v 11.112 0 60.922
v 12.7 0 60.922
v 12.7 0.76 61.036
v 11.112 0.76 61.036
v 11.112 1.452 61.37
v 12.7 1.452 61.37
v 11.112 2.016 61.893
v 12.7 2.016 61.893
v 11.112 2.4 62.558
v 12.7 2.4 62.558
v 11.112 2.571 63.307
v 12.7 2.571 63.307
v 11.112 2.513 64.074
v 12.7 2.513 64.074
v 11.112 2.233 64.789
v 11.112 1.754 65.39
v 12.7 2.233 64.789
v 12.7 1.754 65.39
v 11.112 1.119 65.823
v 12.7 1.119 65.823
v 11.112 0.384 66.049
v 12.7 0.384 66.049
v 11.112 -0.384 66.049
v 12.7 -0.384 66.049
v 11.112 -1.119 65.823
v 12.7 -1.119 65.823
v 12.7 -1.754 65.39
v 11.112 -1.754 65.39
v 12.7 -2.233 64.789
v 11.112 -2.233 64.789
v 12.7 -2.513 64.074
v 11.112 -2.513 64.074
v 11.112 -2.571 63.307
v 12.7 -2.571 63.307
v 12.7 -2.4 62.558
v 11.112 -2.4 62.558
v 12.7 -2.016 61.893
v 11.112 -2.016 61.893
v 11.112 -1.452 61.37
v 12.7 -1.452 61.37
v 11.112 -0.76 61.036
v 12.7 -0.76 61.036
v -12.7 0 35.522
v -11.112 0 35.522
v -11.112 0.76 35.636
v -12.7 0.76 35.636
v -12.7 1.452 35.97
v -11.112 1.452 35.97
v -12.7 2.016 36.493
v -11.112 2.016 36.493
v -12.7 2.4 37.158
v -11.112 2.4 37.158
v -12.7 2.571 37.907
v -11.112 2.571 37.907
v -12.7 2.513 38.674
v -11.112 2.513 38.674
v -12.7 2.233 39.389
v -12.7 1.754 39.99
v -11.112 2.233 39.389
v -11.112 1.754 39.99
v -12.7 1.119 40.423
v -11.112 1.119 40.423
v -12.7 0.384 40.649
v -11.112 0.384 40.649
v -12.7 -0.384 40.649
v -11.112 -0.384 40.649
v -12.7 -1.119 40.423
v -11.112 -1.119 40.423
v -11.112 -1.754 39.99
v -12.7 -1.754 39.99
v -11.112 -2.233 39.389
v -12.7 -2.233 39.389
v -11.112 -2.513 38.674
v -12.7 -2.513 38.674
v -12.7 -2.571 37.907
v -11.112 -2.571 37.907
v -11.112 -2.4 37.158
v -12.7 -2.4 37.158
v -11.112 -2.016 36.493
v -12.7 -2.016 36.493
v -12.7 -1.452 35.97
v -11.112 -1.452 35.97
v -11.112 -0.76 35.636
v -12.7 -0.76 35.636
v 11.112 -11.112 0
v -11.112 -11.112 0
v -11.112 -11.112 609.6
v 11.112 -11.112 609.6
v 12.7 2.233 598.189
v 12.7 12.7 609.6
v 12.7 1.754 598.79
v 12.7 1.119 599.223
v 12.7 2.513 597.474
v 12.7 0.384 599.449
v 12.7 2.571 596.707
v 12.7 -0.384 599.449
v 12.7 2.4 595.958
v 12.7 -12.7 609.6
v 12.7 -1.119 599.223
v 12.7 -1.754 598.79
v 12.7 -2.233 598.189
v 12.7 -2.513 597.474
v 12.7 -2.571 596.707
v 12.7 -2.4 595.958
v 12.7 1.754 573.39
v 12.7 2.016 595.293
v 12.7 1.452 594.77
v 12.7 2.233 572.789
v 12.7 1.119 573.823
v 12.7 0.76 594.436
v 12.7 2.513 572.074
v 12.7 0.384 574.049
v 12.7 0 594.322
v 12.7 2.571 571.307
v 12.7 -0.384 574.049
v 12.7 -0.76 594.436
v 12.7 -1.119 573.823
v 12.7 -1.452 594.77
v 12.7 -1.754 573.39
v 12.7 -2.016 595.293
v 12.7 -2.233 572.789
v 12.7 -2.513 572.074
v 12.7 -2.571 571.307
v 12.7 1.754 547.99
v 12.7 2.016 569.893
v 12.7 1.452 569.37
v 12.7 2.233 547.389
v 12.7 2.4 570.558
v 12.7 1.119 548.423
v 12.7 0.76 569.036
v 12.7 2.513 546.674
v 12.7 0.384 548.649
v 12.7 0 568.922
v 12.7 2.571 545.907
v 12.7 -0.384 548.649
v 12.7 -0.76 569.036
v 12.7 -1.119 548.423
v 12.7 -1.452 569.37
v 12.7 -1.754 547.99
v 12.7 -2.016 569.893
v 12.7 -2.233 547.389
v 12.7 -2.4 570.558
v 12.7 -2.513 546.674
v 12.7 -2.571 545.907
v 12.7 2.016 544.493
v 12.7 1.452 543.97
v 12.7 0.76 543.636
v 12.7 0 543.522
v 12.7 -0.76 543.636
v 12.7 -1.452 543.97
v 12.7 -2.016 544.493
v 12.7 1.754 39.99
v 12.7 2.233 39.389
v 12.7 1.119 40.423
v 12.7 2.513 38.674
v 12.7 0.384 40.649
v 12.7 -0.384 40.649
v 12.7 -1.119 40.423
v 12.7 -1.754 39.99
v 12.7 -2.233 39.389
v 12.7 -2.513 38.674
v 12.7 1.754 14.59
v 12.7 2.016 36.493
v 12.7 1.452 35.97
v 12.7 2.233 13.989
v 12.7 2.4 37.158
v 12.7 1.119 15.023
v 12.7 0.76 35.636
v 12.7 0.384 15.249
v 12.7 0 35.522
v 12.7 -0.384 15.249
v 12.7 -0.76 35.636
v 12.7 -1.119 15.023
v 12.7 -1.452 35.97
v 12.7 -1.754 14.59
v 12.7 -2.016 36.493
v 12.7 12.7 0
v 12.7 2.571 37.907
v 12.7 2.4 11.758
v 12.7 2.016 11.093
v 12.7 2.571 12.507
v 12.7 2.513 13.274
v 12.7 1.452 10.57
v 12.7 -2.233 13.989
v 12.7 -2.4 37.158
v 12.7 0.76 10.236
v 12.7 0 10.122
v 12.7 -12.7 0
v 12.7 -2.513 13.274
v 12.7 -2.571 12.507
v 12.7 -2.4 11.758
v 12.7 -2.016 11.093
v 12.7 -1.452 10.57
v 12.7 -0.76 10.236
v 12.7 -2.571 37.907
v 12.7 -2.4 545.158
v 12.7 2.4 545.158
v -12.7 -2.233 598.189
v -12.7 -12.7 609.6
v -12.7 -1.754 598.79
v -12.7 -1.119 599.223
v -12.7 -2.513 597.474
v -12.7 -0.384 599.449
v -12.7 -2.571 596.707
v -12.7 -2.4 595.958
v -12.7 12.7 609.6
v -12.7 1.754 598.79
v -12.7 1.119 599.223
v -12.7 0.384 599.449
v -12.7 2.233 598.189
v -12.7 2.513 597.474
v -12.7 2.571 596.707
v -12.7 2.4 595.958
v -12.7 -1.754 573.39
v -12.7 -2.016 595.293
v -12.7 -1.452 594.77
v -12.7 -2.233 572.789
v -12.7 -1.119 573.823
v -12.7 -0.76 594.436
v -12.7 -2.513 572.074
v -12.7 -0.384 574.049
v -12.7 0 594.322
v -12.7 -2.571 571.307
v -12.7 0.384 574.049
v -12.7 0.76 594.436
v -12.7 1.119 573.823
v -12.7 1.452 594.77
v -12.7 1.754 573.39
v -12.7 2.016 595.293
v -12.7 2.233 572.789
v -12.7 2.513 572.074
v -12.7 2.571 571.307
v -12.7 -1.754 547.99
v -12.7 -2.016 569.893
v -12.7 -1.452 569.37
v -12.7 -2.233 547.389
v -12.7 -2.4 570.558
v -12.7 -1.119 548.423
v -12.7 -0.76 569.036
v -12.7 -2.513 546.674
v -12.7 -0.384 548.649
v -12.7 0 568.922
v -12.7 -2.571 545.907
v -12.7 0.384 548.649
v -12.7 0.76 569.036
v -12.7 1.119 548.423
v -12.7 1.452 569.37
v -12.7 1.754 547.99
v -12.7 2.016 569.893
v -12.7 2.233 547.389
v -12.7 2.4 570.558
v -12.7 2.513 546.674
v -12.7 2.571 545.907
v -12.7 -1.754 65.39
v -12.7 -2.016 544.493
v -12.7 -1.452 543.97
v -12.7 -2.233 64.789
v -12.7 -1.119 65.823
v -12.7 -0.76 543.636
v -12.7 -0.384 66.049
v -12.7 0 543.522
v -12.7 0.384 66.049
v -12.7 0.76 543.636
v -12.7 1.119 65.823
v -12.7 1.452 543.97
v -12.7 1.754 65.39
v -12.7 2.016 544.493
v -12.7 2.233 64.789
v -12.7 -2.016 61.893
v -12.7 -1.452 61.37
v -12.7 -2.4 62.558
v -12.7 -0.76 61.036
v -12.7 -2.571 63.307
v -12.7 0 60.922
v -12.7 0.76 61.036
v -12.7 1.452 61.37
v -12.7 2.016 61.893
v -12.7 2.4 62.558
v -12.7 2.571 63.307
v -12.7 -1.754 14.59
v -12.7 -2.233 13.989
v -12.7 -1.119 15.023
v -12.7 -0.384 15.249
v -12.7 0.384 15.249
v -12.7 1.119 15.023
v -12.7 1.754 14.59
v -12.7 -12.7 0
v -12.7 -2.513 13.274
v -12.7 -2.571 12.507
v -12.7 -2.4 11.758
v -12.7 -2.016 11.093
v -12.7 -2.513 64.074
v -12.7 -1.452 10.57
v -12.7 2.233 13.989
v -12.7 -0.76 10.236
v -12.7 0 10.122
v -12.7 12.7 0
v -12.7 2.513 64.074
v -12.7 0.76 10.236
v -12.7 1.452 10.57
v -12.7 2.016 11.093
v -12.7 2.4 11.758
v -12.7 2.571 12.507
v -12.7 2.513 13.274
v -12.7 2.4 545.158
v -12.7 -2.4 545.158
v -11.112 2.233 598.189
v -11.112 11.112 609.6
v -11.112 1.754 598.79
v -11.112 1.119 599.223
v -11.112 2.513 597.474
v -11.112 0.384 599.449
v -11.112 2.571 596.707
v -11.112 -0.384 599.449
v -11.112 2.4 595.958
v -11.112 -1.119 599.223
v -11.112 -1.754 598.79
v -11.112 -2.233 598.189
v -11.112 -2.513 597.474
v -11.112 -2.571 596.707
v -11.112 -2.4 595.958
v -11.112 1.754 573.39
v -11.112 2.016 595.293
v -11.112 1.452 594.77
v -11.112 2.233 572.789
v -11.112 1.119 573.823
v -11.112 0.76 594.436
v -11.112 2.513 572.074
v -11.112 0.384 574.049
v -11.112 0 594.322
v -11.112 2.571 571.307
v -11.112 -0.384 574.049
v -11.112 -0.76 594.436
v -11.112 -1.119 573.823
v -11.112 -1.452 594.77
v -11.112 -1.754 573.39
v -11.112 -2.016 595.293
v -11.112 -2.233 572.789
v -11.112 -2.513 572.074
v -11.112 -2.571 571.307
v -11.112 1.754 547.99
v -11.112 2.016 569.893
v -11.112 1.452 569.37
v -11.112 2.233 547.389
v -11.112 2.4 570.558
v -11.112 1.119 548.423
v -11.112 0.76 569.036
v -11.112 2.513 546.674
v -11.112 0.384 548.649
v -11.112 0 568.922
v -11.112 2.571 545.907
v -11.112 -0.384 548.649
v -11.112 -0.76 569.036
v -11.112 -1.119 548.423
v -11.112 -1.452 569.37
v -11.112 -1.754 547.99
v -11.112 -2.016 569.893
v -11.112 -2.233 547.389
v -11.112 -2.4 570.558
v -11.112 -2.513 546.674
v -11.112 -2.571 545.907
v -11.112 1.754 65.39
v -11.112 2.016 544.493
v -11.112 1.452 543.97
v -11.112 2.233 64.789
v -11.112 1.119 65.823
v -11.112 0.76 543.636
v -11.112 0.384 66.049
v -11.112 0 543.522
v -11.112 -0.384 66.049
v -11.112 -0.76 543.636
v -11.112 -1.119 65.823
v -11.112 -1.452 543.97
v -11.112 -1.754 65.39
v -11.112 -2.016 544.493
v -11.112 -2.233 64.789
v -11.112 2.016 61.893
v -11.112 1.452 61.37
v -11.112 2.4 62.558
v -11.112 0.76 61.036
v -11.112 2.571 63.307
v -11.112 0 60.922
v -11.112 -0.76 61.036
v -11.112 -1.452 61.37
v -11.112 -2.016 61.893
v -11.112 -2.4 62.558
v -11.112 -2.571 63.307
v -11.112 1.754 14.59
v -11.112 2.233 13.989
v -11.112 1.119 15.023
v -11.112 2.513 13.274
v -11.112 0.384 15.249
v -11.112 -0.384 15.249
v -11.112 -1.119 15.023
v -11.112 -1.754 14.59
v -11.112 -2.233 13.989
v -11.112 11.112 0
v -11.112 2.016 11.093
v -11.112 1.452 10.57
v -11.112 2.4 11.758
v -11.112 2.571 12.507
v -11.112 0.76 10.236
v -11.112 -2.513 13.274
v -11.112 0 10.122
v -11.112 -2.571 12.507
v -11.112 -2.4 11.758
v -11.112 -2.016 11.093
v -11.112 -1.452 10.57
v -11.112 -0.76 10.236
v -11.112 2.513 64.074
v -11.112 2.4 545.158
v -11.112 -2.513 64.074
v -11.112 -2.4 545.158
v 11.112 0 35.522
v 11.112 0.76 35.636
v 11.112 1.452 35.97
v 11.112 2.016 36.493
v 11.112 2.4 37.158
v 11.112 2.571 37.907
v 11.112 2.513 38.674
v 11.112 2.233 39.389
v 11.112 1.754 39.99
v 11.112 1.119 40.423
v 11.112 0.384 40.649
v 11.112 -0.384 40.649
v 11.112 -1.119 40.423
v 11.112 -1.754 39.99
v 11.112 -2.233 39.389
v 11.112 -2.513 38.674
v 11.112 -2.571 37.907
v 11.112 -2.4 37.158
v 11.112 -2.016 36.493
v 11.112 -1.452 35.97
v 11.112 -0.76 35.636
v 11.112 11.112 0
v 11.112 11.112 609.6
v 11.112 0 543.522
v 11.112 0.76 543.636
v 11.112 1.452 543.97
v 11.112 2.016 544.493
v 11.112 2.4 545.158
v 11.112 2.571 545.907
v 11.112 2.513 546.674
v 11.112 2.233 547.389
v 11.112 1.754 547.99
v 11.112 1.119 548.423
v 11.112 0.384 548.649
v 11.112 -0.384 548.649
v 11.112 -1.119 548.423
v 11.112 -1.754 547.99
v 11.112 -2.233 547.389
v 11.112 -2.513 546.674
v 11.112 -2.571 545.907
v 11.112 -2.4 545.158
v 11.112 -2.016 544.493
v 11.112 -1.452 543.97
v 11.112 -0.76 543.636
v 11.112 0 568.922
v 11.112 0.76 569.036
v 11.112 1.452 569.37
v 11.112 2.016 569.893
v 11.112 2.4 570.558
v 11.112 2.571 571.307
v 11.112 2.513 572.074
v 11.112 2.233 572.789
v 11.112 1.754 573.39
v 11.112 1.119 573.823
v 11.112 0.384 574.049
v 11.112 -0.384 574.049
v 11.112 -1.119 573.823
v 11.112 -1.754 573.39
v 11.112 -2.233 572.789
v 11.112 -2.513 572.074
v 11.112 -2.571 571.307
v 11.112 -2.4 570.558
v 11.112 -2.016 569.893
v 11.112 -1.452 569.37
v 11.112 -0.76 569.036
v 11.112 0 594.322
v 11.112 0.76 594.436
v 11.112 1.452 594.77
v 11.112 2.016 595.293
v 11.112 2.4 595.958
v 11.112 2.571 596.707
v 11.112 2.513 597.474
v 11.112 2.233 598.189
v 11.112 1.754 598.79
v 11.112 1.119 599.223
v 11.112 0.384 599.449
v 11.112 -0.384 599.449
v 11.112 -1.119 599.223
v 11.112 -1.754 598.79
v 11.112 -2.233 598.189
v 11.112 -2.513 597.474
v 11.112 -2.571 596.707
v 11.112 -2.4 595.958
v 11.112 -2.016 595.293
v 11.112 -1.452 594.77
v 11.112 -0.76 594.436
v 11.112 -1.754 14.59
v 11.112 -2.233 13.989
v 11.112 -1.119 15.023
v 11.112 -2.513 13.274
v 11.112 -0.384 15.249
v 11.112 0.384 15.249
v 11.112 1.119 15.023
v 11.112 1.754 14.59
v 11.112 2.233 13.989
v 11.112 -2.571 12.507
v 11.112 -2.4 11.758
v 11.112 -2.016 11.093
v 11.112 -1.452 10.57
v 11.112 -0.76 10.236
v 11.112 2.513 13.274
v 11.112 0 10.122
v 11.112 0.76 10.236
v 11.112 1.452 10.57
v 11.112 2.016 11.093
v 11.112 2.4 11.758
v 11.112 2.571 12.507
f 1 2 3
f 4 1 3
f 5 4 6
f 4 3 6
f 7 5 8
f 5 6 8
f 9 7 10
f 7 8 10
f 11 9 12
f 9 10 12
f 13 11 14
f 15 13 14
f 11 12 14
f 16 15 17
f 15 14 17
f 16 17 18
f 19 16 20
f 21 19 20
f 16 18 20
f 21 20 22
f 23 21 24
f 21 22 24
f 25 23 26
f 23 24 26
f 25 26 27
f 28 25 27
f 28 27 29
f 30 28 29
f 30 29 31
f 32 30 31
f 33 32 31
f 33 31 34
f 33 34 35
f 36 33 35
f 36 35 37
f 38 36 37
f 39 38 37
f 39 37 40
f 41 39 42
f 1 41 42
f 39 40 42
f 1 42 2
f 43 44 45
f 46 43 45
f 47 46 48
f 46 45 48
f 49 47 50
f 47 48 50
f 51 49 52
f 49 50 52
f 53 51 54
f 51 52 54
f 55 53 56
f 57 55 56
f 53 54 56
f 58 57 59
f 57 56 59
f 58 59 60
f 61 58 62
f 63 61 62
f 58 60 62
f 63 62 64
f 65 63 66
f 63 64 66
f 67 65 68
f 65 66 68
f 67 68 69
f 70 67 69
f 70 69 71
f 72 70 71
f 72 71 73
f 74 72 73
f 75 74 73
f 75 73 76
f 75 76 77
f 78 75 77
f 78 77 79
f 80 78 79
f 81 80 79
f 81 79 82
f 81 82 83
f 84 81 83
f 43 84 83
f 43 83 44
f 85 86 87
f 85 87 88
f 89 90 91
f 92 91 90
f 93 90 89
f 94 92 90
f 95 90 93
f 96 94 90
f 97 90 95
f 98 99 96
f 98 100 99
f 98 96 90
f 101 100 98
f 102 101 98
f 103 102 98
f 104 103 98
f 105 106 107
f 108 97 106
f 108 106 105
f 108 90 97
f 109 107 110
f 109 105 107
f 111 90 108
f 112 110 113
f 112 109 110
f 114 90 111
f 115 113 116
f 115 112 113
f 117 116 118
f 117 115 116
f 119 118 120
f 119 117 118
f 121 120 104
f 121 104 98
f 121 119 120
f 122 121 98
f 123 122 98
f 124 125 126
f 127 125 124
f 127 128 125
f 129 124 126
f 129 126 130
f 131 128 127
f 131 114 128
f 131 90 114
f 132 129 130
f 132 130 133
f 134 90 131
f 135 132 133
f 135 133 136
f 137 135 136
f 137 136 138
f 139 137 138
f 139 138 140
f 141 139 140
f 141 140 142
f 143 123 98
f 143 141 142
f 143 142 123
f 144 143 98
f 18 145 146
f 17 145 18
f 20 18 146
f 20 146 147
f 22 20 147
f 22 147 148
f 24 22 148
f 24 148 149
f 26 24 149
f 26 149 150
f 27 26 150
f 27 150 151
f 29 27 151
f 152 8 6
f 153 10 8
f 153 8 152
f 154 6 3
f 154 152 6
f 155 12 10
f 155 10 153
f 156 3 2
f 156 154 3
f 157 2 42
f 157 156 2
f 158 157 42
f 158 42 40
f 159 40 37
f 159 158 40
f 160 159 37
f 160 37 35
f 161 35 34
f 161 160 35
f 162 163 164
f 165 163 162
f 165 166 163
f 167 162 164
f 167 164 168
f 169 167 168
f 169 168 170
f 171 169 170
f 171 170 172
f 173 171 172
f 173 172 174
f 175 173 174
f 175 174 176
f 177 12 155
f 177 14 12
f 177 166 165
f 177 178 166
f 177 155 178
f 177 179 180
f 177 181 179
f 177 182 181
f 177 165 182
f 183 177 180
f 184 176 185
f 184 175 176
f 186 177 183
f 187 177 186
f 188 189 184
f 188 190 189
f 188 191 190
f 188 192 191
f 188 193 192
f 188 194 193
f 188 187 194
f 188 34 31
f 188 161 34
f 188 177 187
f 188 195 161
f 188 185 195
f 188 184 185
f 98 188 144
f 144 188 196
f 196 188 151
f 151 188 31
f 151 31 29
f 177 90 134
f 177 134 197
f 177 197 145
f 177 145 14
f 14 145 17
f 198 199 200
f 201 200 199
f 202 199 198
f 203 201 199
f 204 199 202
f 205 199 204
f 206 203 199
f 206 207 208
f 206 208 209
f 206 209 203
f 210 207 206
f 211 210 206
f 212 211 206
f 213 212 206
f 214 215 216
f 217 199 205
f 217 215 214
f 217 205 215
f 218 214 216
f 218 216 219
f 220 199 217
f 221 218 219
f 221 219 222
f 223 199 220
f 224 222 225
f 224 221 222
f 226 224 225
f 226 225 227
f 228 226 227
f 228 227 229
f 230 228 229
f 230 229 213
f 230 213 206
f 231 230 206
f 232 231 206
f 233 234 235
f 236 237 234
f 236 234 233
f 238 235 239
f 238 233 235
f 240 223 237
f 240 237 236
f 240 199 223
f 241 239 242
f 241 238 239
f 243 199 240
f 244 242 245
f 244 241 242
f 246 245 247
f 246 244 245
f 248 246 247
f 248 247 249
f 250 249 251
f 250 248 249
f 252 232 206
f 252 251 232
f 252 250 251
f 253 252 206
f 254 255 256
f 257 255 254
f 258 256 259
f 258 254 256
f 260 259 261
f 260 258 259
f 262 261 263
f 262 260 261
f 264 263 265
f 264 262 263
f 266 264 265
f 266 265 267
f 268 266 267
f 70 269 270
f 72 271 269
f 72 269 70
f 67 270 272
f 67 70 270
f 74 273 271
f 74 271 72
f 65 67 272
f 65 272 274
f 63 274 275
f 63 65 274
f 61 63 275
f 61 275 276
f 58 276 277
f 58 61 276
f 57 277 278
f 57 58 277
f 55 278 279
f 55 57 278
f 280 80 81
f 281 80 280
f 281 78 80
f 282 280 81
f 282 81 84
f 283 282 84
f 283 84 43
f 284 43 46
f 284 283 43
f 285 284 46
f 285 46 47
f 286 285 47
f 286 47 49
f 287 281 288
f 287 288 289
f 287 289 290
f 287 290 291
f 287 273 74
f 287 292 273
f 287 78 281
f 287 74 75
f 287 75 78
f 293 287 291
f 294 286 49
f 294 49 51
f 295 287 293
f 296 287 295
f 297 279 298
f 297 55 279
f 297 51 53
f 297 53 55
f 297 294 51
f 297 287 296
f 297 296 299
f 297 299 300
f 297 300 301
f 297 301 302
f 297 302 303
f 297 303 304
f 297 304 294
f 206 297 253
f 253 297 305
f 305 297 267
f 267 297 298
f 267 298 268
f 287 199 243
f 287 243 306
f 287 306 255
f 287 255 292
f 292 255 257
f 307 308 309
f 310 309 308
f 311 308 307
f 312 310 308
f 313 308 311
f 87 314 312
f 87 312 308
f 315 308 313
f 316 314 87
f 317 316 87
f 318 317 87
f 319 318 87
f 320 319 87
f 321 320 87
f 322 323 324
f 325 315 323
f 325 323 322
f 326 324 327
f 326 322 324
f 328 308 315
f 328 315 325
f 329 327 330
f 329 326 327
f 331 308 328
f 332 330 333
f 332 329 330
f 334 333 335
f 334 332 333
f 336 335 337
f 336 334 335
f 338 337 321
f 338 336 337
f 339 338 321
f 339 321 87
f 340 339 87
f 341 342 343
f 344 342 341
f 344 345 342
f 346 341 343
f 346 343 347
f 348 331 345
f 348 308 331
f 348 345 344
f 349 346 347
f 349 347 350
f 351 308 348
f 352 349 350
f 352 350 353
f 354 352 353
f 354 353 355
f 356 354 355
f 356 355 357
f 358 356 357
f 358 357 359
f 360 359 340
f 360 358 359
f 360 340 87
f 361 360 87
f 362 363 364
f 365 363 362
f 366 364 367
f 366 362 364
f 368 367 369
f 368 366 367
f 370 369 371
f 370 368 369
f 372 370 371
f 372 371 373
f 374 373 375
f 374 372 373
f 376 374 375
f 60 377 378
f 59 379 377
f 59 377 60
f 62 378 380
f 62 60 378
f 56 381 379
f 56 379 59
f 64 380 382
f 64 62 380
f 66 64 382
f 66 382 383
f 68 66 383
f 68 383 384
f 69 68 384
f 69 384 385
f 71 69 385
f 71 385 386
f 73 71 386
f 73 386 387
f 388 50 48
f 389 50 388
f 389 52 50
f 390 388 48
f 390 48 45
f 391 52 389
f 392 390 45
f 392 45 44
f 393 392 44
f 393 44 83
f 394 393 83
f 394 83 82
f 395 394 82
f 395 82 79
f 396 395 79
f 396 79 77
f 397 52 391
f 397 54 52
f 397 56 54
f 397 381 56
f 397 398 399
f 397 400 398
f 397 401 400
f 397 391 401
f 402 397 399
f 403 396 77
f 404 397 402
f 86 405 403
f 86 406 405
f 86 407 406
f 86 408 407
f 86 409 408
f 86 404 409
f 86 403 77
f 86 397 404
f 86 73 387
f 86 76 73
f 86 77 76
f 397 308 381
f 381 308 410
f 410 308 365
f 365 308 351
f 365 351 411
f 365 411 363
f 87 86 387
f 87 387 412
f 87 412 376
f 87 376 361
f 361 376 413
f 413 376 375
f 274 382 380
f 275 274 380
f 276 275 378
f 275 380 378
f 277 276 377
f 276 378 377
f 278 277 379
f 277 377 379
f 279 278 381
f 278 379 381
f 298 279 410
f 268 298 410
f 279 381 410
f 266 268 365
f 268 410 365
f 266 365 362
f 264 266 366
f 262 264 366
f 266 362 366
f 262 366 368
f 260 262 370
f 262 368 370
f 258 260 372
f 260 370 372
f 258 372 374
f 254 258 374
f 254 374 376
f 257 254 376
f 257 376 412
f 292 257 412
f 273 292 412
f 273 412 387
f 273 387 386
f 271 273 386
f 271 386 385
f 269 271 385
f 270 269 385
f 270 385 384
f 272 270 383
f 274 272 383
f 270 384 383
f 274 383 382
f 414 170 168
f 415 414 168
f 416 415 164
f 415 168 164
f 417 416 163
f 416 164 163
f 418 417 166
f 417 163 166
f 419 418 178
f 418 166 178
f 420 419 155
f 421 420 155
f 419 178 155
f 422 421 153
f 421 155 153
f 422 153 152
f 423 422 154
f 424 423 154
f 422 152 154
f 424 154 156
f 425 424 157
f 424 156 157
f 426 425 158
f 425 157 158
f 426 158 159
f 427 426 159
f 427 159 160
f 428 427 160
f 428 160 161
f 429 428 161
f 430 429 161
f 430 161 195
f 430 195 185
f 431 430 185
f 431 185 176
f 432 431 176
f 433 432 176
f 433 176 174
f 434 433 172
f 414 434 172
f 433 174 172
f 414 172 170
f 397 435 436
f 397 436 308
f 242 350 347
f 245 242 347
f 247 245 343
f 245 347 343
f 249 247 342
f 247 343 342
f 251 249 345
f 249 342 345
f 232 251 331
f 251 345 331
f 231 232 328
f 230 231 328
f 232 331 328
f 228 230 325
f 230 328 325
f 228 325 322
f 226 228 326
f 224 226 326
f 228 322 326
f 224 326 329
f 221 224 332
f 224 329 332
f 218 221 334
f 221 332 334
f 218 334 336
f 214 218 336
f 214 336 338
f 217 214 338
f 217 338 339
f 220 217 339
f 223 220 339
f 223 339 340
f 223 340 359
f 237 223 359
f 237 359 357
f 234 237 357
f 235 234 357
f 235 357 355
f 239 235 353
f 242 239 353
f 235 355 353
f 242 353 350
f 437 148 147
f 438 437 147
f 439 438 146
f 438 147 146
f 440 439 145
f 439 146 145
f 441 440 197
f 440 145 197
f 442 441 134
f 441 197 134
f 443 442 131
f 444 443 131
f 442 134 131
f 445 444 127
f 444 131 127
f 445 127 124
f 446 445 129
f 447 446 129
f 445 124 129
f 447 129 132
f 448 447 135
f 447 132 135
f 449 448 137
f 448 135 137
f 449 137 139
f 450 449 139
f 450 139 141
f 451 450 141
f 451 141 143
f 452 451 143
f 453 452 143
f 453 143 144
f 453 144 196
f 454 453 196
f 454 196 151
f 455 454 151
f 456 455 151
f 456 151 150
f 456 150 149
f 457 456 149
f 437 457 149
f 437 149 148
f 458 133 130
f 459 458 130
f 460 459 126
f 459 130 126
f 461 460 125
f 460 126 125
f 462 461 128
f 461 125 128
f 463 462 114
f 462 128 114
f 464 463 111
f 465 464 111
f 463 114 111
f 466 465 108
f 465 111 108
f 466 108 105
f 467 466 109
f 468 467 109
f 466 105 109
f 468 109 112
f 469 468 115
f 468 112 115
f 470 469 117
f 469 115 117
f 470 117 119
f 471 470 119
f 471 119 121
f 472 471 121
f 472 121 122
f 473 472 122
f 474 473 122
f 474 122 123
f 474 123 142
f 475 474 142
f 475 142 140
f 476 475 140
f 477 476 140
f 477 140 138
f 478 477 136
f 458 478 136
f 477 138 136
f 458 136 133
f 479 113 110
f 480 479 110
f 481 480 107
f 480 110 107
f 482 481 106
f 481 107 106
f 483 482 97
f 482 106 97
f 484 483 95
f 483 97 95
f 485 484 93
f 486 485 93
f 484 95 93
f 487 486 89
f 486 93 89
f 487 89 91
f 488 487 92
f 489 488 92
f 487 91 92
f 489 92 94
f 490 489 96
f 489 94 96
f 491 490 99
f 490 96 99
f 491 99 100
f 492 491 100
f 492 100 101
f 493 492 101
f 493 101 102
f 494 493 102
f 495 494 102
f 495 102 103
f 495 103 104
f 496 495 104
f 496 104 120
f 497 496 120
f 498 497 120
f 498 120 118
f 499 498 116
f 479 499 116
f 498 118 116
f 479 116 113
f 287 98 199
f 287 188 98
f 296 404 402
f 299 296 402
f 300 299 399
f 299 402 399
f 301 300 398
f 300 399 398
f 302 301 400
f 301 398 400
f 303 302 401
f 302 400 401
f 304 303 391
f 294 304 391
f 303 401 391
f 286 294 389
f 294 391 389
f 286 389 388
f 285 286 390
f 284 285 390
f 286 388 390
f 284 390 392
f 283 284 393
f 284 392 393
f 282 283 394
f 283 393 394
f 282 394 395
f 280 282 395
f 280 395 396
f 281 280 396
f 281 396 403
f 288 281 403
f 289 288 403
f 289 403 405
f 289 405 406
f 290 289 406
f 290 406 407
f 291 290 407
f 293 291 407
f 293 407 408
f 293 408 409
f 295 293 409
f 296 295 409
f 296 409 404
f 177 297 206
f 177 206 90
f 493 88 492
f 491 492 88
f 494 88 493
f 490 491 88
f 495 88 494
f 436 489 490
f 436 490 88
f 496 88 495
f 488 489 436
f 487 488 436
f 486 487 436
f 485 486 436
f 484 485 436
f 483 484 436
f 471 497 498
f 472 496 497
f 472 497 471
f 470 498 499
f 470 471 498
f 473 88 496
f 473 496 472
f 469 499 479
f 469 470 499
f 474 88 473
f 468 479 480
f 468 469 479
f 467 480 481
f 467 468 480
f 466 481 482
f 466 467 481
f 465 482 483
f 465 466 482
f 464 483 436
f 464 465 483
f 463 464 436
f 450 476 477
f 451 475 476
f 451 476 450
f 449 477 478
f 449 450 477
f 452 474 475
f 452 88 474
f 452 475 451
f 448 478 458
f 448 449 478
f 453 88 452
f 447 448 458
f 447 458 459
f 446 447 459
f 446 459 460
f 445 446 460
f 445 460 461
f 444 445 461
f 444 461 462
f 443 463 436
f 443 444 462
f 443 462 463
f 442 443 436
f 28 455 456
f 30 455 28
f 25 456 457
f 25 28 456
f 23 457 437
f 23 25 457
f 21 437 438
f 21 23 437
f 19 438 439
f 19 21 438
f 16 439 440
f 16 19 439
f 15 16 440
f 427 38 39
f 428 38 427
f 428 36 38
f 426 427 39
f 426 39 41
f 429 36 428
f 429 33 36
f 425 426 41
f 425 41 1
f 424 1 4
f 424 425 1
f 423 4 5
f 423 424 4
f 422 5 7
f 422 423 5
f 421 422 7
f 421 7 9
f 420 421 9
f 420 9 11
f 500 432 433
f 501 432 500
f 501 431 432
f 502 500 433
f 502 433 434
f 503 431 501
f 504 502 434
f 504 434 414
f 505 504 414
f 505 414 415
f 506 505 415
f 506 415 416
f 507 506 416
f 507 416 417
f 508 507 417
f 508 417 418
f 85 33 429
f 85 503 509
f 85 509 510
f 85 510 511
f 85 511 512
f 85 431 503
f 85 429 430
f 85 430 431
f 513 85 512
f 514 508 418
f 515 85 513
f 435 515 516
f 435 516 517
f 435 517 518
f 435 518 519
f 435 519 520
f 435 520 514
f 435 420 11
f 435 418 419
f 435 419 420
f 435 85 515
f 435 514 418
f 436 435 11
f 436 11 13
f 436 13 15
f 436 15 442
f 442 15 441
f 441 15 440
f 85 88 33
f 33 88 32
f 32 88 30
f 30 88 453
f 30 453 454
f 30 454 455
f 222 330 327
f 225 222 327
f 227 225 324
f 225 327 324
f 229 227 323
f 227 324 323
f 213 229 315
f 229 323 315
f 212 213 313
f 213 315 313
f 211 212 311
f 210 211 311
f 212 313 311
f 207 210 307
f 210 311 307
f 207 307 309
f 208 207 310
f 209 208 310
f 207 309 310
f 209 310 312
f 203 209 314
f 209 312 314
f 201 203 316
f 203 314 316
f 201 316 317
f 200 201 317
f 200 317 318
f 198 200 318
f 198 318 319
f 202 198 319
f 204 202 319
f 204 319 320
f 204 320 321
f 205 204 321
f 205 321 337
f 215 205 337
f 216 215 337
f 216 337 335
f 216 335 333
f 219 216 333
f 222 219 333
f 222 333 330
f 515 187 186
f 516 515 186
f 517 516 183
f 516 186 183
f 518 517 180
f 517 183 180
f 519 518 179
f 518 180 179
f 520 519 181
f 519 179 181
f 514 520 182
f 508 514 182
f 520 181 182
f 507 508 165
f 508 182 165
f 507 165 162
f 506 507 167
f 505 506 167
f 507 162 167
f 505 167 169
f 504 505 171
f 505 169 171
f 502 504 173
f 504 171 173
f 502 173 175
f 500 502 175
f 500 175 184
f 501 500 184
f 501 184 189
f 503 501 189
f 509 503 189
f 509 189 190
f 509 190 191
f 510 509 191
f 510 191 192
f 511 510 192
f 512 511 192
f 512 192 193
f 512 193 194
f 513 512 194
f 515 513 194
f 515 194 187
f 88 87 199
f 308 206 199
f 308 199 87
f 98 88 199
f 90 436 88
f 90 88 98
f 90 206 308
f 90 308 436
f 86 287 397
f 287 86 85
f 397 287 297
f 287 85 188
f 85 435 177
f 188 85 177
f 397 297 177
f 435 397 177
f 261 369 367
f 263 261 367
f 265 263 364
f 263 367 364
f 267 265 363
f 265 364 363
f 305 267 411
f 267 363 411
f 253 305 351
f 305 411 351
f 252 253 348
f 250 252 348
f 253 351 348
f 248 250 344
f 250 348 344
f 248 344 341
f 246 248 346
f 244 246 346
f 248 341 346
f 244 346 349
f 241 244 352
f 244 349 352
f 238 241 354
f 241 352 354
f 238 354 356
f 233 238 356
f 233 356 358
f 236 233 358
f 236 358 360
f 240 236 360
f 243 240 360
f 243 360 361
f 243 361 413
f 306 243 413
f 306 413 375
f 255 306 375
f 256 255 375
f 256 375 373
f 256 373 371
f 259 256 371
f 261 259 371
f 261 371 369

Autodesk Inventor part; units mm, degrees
ref_plane "YZ Plane" through (0, 0, 0) normal (1, 0, 0) x (0, 1, 0)
ref_plane "XZ Plane" through (0, 0, 0) normal (0, 1, 0) x (-1, 0, 0)
ref_plane "XY Plane" through (0, 0, 0) normal (0, 0, 1) x (1, 0, 0)
sketch "Sketch1" plane through (0, 0, 0) normal (0, 0, 1) x (1, 0, 0)
  line L0 (-12.7, -12.7) -> (-12.7, 12.7)
  line L1 (-12.7, 12.7) -> (12.7, 12.7)
  line L2 (12.7, 12.7) -> (12.7, -12.7)
  line L3 (12.7, -12.7) -> (-12.7, -12.7)
  line L4 (-12.7, -12.7) -> (12.7, 12.7) construction
  line L5 (-12.7, 12.7) -> (12.7, -12.7) construction
  line L6 (11.1125, 11.1125) -> (-11.1125, 11.1125)
  line L7 (-11.1125, 11.1125) -> (-11.1125, -11.1125)
  line L8 (-11.1125, -11.1125) -> (11.1125, -11.1125)
  line L9 (11.1125, -11.1125) -> (11.1125, 11.1125)
  point P0 (0, 0)
  dimension "d0" = 25.4
  dimension "d1" = 25.4
  dimension "d2" = 1.5875
extrude "Extrusion1" add sketch "Sketch1" along normal blind 609.6
sketch "Sketch2" plane through (12.7, -12.7, 0) normal (1, 0, 0) x (0, 0, -1)
  line L0 (0, 0) -> (0, 25.4) projected
  line L1 (0, 25.4) -> (-609.6, 25.4) projected
  line L2 (-609.6, 0) -> (-609.6, 25.4) projected
  line L3 (0, 0) -> (-609.6, 0) projected
  circle A0 centre (-596.9, 12.7) radius 2.5781
  circle A1 centre (-571.5, 12.7) radius 2.5781
  circle A2 centre (-546.1, 12.7) radius 2.5781
  line L4 (-304.8, 0) -> (-304.8, 25.4) construction
  circle A3 centre (-12.7, 12.7) radius 2.5781
  circle A4 centre (-38.1, 12.7) radius 2.5781
  circle A5 centre (-63.5, 12.7) radius 2.5781
  point P0 (0, 12.7)
  dimension "d5" = 5.1562
  dimension "d7" = 12.7
  dimension "d8" = 25.4
  dimension "d9" = 25.4
extrude "Extrusion2" cut sketch "Sketch2" against normal through all contours A0 | A1 | A2 | A3 | A4 | A5
equation "\"d1\" = d0"
properties part number "24in long 1in square tube"
